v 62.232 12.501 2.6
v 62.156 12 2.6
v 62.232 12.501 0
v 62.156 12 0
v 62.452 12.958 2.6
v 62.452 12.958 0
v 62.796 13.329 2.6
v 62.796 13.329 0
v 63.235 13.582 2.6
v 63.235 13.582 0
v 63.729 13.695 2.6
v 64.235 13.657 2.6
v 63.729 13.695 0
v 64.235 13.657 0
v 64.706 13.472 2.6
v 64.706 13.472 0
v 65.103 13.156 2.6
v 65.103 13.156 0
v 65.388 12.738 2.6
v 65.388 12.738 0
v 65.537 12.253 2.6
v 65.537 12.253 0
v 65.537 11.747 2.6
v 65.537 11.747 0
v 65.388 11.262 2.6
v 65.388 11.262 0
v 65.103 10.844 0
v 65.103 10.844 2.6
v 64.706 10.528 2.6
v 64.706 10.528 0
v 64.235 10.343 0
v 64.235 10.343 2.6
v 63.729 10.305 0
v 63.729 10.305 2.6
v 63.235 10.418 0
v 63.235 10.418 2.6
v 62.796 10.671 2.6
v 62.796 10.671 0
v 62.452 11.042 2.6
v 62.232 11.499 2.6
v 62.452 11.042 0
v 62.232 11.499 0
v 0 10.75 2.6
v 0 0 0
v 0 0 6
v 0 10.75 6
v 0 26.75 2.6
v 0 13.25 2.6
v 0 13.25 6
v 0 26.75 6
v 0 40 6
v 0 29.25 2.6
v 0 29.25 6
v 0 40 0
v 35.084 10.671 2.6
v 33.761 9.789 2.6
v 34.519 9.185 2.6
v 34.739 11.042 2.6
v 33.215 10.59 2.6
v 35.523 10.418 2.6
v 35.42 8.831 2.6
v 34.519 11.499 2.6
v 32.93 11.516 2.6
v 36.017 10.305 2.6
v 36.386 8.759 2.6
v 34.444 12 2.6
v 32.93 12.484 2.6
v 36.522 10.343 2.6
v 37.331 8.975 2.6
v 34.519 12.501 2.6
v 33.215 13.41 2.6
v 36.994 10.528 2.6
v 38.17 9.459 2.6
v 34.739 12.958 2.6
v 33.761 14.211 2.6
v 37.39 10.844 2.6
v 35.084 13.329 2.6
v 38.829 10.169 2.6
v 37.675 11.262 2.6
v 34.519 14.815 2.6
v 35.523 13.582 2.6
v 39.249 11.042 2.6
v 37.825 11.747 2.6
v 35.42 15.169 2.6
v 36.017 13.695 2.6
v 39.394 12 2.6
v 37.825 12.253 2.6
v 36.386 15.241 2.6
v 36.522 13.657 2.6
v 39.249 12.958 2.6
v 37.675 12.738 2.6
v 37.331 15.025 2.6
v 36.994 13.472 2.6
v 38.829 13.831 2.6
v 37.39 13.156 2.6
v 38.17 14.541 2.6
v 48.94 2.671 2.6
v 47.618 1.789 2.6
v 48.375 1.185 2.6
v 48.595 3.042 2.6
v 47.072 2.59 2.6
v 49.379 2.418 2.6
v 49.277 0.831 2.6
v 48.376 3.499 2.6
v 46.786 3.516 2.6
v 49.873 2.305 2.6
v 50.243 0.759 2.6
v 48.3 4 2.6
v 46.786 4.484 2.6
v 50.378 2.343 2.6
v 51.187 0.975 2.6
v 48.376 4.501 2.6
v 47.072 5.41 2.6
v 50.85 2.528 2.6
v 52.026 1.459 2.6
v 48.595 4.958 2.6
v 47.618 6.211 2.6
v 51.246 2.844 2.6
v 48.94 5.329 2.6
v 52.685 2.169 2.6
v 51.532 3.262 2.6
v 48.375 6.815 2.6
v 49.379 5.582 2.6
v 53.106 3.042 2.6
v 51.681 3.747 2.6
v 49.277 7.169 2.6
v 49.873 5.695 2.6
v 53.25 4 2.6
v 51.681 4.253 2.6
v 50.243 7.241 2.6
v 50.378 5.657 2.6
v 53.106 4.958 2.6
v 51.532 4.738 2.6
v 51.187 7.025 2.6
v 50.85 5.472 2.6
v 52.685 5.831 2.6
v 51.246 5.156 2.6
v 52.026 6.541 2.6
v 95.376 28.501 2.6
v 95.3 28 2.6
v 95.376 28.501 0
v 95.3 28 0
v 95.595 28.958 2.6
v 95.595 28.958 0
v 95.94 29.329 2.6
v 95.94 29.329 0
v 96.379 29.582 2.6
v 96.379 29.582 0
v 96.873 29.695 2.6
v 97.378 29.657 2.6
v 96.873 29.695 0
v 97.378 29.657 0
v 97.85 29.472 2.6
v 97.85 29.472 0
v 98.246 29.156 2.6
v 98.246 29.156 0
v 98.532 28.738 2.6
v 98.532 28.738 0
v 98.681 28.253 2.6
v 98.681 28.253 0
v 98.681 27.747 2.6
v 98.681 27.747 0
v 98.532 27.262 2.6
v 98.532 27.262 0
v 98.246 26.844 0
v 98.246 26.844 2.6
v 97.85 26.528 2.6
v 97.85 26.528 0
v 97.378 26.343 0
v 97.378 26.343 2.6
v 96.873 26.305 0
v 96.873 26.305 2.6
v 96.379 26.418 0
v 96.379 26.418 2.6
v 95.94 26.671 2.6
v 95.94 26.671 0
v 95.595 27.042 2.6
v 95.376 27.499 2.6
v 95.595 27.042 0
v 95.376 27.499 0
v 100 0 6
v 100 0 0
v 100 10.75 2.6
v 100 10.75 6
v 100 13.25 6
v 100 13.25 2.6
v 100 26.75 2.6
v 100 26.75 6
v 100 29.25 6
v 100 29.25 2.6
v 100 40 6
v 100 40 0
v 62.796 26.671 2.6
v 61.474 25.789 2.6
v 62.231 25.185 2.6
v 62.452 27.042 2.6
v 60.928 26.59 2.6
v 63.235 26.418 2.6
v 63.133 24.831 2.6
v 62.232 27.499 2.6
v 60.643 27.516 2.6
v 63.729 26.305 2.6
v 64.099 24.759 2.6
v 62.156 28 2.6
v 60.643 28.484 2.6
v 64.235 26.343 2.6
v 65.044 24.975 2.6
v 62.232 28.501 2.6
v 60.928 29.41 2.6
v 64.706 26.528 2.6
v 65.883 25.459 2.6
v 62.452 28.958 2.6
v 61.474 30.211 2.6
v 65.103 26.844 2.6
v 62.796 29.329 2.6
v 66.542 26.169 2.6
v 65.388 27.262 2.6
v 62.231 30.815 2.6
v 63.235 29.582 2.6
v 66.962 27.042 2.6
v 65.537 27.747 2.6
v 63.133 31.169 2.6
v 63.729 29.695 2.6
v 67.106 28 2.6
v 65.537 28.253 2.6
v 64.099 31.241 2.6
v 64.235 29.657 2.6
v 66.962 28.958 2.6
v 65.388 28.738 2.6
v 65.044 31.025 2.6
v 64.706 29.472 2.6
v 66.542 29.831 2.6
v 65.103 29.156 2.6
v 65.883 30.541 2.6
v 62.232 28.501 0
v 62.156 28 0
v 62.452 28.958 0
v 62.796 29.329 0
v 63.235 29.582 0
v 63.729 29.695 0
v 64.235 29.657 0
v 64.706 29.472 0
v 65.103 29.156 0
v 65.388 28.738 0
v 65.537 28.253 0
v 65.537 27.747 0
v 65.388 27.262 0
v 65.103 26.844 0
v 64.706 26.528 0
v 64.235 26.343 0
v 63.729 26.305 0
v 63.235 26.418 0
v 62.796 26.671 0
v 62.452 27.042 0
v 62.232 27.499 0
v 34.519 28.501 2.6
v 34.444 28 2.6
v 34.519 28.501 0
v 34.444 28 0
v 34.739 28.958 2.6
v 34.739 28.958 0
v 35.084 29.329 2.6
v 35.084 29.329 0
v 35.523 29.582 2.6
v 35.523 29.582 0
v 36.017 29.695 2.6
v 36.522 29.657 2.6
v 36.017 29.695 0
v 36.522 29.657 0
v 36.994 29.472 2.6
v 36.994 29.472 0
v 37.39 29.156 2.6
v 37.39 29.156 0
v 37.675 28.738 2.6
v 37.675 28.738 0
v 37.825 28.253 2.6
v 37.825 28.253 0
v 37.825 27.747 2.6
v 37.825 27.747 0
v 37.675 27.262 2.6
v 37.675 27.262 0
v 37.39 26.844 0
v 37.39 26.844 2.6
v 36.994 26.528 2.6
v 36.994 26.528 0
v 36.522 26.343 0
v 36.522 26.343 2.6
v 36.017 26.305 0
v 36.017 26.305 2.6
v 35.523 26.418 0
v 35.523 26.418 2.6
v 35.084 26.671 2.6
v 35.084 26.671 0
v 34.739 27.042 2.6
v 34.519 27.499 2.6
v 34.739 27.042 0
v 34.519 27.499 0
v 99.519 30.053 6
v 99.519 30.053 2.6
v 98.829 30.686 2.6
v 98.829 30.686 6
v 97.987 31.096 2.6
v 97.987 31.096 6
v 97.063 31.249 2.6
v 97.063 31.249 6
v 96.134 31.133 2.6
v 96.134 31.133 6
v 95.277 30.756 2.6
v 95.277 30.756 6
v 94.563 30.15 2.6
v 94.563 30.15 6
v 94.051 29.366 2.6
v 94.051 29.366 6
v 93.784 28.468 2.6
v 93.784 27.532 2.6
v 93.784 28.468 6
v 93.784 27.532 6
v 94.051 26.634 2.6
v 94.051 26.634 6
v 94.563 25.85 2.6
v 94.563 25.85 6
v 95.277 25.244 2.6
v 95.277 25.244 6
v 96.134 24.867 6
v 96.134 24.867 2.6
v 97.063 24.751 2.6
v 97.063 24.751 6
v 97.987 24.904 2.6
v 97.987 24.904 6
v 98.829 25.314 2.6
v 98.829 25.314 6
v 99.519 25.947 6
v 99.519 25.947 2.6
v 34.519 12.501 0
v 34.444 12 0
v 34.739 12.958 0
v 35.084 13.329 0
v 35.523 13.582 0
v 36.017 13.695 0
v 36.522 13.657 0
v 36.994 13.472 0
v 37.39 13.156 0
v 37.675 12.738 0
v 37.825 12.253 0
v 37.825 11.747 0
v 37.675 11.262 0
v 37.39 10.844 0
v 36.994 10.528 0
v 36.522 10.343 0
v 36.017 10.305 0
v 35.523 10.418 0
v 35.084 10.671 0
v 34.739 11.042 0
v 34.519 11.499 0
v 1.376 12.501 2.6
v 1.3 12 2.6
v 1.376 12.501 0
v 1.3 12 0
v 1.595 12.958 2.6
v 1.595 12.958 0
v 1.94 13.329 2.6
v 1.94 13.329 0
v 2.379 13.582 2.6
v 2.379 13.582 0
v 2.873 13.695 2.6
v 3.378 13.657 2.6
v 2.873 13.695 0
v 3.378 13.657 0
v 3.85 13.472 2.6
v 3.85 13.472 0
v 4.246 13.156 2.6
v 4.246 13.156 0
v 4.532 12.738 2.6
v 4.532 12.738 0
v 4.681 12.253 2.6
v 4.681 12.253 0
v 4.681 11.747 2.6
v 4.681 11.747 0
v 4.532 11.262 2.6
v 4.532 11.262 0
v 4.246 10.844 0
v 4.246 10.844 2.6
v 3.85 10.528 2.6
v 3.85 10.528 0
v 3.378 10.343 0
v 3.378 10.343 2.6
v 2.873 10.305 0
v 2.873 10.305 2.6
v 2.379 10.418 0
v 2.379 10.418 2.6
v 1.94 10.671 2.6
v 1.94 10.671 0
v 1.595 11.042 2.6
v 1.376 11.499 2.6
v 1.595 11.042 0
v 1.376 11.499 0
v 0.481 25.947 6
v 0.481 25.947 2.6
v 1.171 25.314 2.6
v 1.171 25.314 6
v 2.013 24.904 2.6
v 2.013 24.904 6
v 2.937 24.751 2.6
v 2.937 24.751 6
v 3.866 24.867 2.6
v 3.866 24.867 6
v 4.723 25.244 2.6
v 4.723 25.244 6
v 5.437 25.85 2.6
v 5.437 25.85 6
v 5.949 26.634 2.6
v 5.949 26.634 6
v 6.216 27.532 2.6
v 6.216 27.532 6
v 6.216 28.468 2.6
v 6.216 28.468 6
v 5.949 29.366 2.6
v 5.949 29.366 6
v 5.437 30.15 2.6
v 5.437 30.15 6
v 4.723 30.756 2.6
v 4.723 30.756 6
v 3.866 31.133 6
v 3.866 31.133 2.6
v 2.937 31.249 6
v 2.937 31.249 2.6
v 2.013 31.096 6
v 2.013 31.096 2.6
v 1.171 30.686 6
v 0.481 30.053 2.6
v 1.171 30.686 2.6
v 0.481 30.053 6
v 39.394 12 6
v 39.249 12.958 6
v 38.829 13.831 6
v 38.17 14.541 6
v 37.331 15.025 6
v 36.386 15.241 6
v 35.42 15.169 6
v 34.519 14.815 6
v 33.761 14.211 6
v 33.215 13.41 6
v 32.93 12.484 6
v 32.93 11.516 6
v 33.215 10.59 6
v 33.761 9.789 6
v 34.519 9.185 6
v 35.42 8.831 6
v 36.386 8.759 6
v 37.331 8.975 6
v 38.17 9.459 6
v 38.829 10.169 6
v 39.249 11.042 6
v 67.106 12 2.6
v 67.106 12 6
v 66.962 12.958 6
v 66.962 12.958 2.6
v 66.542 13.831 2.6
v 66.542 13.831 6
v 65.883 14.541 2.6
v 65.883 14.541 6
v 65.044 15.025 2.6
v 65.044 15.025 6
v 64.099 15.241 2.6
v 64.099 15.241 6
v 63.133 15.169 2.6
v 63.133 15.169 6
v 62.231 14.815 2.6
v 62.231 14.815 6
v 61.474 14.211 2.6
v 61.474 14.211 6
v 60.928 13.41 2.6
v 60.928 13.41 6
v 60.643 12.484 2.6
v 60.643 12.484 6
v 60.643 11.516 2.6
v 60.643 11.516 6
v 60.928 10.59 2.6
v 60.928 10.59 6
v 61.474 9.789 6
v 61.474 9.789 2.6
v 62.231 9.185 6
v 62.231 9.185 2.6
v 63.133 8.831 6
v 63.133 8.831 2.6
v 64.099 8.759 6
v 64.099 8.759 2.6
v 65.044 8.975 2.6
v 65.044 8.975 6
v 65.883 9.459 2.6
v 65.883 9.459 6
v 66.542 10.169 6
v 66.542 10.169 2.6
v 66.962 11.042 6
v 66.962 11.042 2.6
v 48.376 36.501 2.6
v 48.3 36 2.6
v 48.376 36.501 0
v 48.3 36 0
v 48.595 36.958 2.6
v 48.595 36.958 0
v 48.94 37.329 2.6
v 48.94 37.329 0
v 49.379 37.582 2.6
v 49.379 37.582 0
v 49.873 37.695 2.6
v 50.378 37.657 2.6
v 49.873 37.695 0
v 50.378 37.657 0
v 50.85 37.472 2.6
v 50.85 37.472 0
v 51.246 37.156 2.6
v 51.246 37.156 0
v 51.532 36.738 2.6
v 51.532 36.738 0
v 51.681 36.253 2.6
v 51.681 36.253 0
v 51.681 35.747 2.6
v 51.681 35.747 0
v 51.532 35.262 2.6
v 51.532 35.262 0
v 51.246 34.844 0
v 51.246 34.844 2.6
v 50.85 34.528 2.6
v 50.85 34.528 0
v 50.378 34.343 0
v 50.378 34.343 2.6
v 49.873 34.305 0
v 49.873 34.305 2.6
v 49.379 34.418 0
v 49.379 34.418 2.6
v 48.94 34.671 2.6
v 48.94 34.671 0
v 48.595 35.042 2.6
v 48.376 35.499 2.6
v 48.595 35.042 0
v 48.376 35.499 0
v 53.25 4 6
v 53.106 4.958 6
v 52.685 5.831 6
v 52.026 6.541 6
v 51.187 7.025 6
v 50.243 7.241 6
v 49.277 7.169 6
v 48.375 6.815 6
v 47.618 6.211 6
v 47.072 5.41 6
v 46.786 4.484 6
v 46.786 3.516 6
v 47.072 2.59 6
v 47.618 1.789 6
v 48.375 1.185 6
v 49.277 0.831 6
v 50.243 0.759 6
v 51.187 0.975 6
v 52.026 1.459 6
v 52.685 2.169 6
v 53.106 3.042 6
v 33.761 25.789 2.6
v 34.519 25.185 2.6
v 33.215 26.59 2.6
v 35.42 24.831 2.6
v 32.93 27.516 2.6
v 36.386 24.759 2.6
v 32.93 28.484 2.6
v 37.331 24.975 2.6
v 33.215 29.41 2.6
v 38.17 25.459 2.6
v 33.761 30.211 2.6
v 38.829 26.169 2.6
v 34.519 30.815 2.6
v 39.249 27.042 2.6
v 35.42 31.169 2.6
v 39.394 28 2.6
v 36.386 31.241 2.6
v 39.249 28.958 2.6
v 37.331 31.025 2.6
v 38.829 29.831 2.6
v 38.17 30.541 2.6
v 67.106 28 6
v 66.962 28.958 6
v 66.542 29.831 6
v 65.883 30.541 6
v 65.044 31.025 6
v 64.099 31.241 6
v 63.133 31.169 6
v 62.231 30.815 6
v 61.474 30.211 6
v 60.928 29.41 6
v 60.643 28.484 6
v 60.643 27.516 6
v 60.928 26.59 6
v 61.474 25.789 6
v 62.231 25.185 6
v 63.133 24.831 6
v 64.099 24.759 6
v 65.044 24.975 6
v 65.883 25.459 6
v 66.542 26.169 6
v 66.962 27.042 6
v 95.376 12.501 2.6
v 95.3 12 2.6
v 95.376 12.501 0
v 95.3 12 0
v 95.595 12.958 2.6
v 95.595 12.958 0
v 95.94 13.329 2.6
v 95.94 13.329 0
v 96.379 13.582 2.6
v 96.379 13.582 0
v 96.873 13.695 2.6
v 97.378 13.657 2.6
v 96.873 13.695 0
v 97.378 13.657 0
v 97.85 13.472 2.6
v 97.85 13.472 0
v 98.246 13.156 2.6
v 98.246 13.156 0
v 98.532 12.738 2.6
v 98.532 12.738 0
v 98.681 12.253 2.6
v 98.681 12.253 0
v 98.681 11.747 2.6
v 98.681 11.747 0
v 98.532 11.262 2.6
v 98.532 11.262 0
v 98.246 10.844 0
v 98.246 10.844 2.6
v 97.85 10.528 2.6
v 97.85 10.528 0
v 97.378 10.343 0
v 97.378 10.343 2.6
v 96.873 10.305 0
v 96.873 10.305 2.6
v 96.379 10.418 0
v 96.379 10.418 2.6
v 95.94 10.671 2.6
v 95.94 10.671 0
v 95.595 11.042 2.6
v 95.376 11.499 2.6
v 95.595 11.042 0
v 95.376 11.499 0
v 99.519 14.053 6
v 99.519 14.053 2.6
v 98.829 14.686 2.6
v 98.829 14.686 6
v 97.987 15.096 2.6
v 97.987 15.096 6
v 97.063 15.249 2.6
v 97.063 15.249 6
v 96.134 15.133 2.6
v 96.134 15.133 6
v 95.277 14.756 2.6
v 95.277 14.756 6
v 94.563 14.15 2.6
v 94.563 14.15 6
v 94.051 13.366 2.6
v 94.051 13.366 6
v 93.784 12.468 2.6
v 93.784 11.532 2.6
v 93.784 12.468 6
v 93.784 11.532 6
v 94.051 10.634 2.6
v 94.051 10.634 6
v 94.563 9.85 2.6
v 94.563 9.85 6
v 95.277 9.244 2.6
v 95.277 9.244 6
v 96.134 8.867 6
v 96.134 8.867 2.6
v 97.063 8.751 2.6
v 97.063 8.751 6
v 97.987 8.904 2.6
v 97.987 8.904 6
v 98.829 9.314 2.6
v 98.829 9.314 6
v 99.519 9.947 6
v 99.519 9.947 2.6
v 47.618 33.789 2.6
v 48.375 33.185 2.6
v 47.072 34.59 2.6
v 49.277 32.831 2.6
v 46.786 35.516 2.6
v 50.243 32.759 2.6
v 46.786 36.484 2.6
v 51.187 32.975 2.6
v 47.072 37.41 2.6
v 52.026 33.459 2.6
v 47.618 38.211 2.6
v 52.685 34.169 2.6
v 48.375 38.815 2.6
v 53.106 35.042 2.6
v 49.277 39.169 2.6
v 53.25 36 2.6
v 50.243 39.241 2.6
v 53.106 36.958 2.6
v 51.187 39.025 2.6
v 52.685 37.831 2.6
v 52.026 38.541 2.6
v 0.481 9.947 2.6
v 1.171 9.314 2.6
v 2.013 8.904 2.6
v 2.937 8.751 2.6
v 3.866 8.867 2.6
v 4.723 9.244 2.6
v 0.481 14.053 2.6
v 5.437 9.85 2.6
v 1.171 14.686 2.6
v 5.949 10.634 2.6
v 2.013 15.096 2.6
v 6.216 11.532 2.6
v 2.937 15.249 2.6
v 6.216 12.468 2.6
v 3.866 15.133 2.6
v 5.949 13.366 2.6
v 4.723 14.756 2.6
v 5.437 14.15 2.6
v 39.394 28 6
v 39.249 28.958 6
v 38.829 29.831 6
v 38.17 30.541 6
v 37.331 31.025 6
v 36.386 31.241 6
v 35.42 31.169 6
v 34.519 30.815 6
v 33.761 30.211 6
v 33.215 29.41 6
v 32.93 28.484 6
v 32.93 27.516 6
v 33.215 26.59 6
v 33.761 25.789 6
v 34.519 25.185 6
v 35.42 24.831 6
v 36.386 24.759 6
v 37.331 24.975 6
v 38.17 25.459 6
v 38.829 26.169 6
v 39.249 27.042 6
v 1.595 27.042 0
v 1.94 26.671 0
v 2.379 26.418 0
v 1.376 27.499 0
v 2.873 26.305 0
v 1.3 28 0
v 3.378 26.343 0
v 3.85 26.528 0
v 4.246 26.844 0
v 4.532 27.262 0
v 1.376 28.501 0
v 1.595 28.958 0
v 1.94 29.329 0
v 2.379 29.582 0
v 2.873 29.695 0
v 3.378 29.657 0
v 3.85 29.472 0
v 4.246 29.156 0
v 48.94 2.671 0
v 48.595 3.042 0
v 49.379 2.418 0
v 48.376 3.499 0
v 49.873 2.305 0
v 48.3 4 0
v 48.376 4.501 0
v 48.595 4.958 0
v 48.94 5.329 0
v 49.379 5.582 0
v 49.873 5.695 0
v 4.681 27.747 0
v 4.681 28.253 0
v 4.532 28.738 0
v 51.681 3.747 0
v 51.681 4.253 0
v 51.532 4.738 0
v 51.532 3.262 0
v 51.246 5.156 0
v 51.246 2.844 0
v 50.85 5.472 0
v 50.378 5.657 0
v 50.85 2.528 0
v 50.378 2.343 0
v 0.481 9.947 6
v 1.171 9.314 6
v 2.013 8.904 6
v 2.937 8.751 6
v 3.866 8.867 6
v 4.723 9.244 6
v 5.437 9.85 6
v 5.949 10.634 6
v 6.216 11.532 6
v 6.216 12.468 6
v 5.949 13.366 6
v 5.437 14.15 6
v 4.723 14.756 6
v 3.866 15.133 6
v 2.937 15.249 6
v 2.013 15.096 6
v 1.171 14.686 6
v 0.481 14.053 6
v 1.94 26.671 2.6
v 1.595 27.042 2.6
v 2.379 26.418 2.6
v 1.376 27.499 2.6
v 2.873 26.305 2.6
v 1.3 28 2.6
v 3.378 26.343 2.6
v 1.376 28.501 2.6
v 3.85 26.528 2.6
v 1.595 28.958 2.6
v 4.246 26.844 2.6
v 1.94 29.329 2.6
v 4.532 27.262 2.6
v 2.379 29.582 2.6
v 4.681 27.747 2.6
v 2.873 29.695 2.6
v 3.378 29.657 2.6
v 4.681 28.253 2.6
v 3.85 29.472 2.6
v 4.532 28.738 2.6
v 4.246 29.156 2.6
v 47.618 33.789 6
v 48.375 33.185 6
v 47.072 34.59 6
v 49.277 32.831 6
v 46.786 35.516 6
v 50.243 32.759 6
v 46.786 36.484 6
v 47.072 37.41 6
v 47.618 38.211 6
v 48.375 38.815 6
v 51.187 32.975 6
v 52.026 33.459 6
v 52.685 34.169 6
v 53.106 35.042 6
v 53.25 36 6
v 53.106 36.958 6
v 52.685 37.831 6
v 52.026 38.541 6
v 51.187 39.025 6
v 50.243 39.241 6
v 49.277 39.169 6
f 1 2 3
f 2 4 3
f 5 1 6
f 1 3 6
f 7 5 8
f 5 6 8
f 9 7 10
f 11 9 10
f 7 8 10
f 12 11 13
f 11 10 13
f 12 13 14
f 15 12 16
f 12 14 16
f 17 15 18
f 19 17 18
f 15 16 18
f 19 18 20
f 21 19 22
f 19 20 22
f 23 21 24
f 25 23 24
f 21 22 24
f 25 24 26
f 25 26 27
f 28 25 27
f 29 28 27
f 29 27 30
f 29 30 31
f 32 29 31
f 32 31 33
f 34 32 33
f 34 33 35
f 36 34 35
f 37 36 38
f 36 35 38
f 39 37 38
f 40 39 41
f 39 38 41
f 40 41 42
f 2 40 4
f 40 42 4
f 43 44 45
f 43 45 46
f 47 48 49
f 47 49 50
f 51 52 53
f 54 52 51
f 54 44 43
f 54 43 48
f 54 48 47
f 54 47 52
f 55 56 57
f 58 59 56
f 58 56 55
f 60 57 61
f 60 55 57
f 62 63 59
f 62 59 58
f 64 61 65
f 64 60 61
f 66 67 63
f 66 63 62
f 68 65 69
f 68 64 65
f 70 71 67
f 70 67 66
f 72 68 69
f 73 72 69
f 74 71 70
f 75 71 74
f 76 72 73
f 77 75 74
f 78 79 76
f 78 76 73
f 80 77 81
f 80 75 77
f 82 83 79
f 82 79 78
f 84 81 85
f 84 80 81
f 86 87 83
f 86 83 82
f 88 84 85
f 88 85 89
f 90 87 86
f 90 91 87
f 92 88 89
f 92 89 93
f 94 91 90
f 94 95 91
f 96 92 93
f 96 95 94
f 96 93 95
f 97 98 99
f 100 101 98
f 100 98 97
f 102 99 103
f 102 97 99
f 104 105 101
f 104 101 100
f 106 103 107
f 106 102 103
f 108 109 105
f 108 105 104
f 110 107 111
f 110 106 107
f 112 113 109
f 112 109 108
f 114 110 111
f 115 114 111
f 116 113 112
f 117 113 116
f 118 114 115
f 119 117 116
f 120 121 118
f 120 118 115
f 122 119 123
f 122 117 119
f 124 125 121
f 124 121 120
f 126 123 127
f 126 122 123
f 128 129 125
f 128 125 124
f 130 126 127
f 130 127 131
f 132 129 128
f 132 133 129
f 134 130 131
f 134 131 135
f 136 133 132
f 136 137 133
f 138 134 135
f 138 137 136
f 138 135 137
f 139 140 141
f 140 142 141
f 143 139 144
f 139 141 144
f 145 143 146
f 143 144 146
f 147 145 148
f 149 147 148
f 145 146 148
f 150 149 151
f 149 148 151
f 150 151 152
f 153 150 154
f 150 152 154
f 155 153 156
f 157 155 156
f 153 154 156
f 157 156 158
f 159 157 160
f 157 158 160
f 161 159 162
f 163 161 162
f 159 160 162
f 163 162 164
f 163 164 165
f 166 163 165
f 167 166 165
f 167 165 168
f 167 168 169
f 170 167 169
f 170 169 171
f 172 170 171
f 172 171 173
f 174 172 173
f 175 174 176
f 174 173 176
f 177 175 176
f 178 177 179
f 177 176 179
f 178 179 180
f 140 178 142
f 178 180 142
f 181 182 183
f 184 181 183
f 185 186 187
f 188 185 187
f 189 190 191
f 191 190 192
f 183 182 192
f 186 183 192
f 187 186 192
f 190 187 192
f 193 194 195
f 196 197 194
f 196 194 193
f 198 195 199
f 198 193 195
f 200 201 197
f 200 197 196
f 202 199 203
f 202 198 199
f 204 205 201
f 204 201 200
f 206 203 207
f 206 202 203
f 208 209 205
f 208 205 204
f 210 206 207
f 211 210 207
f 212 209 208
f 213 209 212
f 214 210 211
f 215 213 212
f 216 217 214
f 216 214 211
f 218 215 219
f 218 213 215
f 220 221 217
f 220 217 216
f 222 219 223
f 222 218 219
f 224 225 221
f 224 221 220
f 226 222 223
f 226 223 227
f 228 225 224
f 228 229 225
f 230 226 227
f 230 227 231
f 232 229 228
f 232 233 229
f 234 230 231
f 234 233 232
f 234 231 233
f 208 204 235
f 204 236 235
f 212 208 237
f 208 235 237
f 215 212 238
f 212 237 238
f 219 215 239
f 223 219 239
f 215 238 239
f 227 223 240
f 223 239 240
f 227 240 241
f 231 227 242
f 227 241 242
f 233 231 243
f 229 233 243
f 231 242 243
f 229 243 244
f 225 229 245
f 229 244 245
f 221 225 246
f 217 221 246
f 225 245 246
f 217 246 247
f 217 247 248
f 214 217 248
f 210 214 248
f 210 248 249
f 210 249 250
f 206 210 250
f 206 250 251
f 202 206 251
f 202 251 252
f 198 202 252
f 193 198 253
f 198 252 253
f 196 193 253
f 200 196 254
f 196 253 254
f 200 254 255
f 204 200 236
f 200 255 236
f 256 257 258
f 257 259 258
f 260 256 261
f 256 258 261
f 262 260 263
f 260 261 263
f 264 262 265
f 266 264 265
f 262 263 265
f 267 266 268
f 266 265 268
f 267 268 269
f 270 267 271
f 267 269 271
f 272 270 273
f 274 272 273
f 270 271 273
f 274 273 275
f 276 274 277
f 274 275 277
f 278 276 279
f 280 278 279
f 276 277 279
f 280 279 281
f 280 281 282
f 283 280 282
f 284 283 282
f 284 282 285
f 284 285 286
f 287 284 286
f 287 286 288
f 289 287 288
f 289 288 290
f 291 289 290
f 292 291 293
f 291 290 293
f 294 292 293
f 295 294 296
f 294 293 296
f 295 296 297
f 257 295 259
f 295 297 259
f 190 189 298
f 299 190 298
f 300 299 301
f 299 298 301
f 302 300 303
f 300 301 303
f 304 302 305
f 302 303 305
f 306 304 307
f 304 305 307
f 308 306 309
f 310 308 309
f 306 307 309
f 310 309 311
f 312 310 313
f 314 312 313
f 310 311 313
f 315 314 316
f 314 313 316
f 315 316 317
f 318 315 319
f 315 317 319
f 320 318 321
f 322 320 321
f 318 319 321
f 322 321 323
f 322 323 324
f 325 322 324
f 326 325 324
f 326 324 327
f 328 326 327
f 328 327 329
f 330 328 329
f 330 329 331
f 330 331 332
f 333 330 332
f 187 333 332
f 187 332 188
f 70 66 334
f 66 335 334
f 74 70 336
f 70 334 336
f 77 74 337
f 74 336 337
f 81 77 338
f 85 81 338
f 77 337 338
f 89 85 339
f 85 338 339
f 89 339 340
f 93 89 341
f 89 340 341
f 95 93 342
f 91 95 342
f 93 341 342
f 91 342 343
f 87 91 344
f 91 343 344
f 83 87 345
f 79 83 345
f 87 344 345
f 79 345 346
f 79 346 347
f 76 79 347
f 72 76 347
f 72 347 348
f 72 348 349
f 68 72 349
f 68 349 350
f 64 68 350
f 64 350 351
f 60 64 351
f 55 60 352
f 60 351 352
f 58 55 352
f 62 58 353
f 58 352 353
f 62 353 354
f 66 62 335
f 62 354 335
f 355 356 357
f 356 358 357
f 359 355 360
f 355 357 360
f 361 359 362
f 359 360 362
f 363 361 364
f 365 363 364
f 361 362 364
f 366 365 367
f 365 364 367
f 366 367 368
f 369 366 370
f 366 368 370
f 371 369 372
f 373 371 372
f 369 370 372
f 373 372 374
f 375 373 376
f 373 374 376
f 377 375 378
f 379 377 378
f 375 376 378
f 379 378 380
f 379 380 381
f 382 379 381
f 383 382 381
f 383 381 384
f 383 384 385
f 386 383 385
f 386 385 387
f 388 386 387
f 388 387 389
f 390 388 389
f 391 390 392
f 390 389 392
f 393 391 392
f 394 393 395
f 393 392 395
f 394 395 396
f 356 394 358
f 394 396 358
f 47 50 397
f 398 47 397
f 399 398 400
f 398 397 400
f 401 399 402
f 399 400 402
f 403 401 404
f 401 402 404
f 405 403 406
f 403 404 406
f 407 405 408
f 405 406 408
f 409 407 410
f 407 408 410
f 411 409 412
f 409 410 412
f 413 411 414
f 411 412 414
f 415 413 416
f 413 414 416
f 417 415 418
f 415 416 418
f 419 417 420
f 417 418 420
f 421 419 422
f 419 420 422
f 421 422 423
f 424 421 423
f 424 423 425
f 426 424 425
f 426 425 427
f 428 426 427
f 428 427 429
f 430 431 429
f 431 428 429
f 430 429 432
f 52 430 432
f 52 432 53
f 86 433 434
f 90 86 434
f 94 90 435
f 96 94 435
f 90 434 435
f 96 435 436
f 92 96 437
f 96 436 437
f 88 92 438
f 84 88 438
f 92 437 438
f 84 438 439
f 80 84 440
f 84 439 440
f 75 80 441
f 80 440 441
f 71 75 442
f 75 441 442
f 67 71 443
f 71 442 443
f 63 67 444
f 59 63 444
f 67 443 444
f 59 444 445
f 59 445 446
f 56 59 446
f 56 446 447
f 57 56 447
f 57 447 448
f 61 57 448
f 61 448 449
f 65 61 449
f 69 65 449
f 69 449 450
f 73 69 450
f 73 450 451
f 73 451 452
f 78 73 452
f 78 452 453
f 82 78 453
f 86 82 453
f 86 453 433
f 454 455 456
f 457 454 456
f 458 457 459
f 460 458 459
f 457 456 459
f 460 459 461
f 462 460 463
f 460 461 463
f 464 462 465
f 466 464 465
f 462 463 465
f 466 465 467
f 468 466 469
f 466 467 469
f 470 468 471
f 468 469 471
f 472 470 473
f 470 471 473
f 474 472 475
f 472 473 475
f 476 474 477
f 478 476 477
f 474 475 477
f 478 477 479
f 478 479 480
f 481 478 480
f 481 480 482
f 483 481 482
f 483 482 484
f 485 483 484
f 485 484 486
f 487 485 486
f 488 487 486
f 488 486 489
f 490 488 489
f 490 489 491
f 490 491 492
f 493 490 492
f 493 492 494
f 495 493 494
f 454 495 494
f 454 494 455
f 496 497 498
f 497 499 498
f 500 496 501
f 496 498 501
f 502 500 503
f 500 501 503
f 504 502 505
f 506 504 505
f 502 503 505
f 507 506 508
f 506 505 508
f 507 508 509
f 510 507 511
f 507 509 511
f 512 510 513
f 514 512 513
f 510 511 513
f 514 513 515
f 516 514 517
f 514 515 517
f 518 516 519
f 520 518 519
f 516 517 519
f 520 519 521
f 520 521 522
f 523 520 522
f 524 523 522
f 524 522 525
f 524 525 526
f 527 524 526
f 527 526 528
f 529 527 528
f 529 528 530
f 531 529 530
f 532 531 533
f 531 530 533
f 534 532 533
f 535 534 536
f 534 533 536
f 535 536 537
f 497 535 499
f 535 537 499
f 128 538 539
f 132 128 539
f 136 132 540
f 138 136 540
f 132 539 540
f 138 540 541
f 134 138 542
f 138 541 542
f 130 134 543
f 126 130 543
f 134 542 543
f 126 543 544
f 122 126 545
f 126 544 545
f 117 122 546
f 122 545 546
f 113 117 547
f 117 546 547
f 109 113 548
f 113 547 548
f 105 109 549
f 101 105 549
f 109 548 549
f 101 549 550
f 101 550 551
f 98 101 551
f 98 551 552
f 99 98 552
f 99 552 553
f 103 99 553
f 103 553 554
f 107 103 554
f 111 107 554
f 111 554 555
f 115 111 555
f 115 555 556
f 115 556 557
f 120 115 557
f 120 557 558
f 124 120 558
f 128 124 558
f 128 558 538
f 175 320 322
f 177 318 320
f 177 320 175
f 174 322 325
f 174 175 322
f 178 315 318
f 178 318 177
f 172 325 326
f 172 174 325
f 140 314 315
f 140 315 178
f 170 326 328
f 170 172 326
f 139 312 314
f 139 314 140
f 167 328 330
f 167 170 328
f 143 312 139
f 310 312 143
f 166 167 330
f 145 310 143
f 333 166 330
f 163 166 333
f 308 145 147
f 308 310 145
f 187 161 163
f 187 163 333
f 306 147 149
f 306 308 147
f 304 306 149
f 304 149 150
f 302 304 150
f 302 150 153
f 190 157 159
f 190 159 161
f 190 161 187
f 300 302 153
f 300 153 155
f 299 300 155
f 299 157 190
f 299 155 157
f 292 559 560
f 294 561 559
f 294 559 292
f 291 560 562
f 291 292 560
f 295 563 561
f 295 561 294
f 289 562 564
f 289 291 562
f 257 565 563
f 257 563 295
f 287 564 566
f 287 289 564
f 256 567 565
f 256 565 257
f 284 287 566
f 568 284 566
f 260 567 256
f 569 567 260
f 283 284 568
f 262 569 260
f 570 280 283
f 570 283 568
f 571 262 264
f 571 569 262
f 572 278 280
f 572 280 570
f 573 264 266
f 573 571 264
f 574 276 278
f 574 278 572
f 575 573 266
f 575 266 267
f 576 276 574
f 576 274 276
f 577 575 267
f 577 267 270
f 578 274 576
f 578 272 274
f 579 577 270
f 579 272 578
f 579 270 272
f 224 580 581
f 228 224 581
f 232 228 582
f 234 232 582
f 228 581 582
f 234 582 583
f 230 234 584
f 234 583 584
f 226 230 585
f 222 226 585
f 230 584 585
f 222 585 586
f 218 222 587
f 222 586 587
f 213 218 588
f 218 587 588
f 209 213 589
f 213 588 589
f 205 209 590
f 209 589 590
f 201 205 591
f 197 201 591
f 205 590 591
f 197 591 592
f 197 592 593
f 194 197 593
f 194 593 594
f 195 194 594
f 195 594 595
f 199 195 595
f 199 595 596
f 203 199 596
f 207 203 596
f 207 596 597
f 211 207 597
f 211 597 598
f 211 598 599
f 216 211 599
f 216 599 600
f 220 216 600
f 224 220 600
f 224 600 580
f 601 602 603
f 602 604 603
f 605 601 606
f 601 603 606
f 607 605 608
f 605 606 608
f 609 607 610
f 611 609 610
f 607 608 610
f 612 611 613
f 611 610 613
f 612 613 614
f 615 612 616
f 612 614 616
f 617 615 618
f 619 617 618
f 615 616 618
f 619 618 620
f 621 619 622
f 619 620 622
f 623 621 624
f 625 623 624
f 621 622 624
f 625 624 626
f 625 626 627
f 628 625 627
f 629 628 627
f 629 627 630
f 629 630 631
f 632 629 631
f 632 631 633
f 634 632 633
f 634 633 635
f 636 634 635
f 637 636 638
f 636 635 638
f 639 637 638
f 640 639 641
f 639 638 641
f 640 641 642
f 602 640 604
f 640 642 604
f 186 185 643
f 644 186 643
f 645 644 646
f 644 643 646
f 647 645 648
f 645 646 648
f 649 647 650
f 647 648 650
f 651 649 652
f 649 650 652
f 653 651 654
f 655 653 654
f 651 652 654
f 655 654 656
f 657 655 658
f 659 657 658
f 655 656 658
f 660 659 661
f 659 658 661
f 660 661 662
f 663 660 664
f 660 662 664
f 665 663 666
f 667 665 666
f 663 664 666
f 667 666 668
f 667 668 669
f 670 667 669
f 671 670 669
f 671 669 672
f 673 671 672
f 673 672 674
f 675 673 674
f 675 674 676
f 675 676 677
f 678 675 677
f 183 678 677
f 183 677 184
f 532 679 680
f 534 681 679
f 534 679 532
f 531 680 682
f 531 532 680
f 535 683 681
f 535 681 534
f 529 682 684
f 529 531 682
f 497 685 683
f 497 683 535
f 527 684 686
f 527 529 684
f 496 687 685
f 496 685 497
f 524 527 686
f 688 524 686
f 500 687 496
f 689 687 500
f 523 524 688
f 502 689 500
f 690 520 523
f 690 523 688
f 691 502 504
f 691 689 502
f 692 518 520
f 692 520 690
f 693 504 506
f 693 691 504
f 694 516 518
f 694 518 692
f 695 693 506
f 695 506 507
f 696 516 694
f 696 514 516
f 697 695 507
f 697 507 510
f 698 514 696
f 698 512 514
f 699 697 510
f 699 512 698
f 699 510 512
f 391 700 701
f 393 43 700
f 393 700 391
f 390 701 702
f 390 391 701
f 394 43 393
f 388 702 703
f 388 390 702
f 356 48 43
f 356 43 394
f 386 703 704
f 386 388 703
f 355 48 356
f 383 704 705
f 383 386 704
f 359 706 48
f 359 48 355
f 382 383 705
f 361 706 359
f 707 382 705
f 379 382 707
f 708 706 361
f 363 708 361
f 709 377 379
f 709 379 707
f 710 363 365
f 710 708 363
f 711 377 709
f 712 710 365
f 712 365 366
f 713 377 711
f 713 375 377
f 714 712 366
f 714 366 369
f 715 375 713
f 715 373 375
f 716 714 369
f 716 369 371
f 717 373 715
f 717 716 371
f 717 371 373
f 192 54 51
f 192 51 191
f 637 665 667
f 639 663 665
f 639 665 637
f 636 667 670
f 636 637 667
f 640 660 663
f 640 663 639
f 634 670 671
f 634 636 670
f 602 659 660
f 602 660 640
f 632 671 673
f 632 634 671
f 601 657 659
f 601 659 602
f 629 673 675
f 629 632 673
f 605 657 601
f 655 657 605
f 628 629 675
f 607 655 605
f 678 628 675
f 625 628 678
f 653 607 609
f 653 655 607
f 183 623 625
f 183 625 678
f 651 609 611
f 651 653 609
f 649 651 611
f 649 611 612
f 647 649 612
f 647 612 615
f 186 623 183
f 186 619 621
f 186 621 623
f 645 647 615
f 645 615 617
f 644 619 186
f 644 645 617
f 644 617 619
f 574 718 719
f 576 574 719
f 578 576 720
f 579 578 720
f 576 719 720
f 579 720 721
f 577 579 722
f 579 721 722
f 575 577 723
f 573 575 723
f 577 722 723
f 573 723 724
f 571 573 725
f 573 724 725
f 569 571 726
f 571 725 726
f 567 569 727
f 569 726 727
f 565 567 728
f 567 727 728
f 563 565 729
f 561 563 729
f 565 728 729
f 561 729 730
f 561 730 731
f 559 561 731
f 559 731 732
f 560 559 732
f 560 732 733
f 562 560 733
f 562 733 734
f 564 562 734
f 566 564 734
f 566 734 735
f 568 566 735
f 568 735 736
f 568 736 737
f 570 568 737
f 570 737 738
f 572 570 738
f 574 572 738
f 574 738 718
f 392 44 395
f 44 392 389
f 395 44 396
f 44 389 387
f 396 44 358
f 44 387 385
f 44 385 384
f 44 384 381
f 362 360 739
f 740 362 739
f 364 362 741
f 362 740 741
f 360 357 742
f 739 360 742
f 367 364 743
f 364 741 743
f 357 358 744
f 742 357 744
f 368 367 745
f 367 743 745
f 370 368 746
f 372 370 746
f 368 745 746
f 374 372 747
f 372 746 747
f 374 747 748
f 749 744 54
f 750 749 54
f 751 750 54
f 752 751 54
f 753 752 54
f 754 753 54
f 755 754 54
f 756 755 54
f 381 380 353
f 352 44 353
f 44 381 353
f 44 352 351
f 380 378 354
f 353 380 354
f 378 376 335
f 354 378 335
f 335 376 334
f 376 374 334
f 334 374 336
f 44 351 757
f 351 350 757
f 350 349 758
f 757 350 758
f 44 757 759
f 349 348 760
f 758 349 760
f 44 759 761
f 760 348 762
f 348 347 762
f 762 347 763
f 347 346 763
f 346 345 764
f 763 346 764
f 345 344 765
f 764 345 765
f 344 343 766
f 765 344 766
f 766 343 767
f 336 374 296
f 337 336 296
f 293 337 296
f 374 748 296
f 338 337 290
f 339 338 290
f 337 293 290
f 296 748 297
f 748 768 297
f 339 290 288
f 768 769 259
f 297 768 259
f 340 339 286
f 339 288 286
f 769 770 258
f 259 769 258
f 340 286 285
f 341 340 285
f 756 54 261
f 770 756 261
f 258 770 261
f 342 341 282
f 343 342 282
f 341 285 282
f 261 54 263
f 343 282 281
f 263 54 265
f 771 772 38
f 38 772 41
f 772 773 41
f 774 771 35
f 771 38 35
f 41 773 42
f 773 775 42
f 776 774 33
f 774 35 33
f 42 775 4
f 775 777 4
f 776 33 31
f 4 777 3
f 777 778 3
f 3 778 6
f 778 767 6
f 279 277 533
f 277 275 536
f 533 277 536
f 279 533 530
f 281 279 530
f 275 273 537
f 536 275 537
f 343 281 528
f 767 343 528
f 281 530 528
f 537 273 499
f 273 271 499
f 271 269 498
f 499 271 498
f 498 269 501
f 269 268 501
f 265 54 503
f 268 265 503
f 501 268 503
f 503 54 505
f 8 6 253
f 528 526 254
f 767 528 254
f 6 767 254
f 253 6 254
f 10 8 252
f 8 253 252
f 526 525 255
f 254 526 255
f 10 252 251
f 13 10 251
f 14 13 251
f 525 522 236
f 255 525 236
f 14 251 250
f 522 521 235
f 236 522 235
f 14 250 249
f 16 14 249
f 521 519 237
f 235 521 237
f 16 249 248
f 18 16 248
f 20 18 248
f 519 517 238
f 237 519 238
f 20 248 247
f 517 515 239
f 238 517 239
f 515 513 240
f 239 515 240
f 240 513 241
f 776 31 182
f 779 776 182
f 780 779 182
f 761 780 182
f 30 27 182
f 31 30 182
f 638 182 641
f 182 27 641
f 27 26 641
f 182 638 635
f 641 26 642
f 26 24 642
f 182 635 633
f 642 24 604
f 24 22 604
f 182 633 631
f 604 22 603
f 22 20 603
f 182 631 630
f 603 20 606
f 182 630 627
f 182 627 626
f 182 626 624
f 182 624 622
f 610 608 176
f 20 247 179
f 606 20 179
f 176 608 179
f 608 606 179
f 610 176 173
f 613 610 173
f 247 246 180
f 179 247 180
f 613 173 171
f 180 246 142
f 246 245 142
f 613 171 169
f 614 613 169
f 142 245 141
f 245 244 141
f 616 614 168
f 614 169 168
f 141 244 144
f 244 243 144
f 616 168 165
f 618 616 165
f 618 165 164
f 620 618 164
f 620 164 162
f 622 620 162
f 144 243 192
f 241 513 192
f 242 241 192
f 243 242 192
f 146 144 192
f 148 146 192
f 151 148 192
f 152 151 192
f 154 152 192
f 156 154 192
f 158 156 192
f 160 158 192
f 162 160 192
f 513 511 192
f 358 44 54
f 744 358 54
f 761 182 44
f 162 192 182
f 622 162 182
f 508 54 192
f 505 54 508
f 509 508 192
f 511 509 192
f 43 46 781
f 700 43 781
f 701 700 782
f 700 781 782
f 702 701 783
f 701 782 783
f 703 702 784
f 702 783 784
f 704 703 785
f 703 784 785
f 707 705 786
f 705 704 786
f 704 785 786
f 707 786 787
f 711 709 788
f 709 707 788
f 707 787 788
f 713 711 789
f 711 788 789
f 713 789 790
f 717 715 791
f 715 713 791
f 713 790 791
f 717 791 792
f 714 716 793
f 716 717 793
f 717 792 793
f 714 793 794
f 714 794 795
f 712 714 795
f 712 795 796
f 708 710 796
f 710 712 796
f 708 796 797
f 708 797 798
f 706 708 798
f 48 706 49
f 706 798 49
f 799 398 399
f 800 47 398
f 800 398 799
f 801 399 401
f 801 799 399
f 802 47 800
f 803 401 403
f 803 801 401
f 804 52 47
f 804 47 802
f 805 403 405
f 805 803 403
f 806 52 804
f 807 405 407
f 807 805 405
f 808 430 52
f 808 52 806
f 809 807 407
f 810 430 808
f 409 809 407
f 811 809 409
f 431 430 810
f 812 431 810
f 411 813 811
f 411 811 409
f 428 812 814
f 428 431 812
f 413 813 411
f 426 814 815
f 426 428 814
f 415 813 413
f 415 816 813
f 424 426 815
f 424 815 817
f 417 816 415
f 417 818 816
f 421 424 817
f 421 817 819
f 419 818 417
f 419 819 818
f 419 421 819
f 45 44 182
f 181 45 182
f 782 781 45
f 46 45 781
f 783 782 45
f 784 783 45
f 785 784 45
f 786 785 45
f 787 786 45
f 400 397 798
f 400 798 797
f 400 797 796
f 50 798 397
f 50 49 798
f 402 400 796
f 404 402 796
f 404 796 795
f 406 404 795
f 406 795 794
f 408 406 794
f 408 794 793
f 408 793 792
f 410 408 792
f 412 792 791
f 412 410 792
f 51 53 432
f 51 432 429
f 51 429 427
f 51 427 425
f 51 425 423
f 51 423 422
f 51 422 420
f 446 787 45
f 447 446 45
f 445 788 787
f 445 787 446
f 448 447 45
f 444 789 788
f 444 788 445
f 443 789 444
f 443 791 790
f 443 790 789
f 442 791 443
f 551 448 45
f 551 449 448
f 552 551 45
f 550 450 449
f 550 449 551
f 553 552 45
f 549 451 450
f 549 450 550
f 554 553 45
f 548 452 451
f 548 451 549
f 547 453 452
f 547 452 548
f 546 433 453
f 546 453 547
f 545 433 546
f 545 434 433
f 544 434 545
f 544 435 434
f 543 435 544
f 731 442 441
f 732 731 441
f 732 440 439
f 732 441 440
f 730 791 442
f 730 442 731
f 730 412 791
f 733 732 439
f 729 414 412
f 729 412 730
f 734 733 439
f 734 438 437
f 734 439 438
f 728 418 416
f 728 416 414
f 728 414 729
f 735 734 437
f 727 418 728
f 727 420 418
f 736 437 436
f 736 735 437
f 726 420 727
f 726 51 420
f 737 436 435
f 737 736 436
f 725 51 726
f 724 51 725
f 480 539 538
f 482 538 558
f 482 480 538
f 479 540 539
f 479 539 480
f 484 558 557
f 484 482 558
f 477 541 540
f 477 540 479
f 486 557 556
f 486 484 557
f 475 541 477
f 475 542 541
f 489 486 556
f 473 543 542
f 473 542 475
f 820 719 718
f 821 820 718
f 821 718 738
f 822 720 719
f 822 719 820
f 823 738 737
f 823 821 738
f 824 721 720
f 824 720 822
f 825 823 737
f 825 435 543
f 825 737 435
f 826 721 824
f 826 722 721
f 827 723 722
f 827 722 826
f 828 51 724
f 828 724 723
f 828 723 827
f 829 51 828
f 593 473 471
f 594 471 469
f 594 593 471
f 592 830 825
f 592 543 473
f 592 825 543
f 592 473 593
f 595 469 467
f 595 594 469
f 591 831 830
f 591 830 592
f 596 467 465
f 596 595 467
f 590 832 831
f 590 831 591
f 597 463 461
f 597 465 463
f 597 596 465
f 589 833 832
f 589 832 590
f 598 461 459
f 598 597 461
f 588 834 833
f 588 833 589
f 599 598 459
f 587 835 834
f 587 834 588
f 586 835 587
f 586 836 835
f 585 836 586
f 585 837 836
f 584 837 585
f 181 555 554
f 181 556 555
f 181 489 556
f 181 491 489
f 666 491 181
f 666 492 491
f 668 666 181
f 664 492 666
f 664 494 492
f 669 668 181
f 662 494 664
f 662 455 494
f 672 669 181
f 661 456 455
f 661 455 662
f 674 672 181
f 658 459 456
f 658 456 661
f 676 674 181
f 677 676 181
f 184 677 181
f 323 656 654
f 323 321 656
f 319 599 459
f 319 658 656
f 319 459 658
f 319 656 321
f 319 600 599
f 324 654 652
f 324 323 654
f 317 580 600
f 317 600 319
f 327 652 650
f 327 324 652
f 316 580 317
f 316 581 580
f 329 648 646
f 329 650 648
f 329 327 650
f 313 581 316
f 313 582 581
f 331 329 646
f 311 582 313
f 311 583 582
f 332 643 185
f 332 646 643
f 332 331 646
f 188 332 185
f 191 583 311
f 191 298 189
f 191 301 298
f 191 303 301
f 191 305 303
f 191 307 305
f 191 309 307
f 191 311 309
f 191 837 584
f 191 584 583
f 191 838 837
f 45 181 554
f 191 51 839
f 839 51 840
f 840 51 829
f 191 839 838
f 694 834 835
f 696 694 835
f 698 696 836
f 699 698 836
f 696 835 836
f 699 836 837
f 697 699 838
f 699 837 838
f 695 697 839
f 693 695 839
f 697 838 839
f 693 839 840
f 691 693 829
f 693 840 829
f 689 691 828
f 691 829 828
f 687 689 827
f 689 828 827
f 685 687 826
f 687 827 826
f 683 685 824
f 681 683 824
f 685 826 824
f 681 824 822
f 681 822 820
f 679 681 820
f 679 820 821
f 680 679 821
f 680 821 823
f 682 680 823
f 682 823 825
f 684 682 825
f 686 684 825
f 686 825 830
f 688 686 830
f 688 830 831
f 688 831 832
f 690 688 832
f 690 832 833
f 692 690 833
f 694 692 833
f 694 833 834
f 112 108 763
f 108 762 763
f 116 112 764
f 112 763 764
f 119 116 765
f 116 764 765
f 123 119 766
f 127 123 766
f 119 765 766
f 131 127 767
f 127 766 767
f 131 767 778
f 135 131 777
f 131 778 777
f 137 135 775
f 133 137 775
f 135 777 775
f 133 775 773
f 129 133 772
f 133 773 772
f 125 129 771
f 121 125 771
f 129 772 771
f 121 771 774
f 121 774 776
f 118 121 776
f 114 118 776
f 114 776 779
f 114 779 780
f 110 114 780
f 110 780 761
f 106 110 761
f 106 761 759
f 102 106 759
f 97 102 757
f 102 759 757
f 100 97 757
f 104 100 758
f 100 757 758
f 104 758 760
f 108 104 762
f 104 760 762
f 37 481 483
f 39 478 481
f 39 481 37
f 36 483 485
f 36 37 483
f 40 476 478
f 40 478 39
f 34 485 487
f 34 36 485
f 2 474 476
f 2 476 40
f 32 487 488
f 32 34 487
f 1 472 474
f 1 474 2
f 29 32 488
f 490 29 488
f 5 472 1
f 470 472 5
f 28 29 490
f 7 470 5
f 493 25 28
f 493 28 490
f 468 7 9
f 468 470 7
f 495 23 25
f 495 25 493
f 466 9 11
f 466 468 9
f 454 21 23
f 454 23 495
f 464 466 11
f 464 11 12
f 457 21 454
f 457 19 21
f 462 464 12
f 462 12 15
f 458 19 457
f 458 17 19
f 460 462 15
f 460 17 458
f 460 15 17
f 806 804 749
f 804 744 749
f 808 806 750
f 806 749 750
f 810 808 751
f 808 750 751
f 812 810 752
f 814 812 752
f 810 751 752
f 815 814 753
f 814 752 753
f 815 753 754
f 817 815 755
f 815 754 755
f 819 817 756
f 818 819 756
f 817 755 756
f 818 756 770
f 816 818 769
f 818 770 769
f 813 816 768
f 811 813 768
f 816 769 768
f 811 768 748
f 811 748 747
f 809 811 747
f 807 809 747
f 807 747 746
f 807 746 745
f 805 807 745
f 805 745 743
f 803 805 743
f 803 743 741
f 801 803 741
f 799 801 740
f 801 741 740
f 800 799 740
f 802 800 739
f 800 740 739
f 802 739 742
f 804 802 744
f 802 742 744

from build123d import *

# Parameters (mm, degrees)
SKETCH1_W                                           = 100
SKETCH1_H                                           = 40
BOSS_EXTRUDE1_DEPTH                                 = 6
CBORE_FOR_M3_HEX_SOCKET_HEAD_CAP_SCREW1_D           = 3.4
CBORE_FOR_M3_HEX_SOCKET_HEAD_CAP_SCREW1_CBORE_D     = 6.5
CBORE_FOR_M3_HEX_SOCKET_HEAD_CAP_SCREW1_CBORE_DEPTH = 3.4
CBORE_FOR_M3_HEX_SOCKET_HEAD_CAP_SCREW2_D           = 3.4
CBORE_FOR_M3_HEX_SOCKET_HEAD_CAP_SCREW2_CBORE_D     = 6.5
CBORE_FOR_M3_HEX_SOCKET_HEAD_CAP_SCREW2_CBORE_DEPTH = 3.4


with BuildPart() as part:
    # Sketch1 → Boss-Extrude1 (new body)
    with BuildSketch(Plane.XY):
        with Locations((50, 20)):
            Rectangle(SKETCH1_W, SKETCH1_H)
    extrude(amount=BOSS_EXTRUDE1_DEPTH)

    # CBORE for M3 Hex Socket Head Cap Screw1 (through all)
    with Locations(Plane.XY.offset(6)):
        with Locations((3, 28), (97, 28), (97, 12), (3, 12)):
            CounterBoreHole(CBORE_FOR_M3_HEX_SOCKET_HEAD_CAP_SCREW1_D / 2, CBORE_FOR_M3_HEX_SOCKET_HEAD_CAP_SCREW1_CBORE_D / 2, CBORE_FOR_M3_HEX_SOCKET_HEAD_CAP_SCREW1_CBORE_DEPTH)

    # CBORE for M3 Hex Socket Head Cap Screw2 (through all)
    with Locations(Plane.XY.offset(6)):
        with Locations((36.143593539, 28), (50, 36), (63.856406461, 28), (63.856406461, 12), (50, 4), (36.143593539, 12)):
            CounterBoreHole(CBORE_FOR_M3_HEX_SOCKET_HEAD_CAP_SCREW2_D / 2, CBORE_FOR_M3_HEX_SOCKET_HEAD_CAP_SCREW2_CBORE_D / 2, CBORE_FOR_M3_HEX_SOCKET_HEAD_CAP_SCREW2_CBORE_DEPTH)


solid = part.part
